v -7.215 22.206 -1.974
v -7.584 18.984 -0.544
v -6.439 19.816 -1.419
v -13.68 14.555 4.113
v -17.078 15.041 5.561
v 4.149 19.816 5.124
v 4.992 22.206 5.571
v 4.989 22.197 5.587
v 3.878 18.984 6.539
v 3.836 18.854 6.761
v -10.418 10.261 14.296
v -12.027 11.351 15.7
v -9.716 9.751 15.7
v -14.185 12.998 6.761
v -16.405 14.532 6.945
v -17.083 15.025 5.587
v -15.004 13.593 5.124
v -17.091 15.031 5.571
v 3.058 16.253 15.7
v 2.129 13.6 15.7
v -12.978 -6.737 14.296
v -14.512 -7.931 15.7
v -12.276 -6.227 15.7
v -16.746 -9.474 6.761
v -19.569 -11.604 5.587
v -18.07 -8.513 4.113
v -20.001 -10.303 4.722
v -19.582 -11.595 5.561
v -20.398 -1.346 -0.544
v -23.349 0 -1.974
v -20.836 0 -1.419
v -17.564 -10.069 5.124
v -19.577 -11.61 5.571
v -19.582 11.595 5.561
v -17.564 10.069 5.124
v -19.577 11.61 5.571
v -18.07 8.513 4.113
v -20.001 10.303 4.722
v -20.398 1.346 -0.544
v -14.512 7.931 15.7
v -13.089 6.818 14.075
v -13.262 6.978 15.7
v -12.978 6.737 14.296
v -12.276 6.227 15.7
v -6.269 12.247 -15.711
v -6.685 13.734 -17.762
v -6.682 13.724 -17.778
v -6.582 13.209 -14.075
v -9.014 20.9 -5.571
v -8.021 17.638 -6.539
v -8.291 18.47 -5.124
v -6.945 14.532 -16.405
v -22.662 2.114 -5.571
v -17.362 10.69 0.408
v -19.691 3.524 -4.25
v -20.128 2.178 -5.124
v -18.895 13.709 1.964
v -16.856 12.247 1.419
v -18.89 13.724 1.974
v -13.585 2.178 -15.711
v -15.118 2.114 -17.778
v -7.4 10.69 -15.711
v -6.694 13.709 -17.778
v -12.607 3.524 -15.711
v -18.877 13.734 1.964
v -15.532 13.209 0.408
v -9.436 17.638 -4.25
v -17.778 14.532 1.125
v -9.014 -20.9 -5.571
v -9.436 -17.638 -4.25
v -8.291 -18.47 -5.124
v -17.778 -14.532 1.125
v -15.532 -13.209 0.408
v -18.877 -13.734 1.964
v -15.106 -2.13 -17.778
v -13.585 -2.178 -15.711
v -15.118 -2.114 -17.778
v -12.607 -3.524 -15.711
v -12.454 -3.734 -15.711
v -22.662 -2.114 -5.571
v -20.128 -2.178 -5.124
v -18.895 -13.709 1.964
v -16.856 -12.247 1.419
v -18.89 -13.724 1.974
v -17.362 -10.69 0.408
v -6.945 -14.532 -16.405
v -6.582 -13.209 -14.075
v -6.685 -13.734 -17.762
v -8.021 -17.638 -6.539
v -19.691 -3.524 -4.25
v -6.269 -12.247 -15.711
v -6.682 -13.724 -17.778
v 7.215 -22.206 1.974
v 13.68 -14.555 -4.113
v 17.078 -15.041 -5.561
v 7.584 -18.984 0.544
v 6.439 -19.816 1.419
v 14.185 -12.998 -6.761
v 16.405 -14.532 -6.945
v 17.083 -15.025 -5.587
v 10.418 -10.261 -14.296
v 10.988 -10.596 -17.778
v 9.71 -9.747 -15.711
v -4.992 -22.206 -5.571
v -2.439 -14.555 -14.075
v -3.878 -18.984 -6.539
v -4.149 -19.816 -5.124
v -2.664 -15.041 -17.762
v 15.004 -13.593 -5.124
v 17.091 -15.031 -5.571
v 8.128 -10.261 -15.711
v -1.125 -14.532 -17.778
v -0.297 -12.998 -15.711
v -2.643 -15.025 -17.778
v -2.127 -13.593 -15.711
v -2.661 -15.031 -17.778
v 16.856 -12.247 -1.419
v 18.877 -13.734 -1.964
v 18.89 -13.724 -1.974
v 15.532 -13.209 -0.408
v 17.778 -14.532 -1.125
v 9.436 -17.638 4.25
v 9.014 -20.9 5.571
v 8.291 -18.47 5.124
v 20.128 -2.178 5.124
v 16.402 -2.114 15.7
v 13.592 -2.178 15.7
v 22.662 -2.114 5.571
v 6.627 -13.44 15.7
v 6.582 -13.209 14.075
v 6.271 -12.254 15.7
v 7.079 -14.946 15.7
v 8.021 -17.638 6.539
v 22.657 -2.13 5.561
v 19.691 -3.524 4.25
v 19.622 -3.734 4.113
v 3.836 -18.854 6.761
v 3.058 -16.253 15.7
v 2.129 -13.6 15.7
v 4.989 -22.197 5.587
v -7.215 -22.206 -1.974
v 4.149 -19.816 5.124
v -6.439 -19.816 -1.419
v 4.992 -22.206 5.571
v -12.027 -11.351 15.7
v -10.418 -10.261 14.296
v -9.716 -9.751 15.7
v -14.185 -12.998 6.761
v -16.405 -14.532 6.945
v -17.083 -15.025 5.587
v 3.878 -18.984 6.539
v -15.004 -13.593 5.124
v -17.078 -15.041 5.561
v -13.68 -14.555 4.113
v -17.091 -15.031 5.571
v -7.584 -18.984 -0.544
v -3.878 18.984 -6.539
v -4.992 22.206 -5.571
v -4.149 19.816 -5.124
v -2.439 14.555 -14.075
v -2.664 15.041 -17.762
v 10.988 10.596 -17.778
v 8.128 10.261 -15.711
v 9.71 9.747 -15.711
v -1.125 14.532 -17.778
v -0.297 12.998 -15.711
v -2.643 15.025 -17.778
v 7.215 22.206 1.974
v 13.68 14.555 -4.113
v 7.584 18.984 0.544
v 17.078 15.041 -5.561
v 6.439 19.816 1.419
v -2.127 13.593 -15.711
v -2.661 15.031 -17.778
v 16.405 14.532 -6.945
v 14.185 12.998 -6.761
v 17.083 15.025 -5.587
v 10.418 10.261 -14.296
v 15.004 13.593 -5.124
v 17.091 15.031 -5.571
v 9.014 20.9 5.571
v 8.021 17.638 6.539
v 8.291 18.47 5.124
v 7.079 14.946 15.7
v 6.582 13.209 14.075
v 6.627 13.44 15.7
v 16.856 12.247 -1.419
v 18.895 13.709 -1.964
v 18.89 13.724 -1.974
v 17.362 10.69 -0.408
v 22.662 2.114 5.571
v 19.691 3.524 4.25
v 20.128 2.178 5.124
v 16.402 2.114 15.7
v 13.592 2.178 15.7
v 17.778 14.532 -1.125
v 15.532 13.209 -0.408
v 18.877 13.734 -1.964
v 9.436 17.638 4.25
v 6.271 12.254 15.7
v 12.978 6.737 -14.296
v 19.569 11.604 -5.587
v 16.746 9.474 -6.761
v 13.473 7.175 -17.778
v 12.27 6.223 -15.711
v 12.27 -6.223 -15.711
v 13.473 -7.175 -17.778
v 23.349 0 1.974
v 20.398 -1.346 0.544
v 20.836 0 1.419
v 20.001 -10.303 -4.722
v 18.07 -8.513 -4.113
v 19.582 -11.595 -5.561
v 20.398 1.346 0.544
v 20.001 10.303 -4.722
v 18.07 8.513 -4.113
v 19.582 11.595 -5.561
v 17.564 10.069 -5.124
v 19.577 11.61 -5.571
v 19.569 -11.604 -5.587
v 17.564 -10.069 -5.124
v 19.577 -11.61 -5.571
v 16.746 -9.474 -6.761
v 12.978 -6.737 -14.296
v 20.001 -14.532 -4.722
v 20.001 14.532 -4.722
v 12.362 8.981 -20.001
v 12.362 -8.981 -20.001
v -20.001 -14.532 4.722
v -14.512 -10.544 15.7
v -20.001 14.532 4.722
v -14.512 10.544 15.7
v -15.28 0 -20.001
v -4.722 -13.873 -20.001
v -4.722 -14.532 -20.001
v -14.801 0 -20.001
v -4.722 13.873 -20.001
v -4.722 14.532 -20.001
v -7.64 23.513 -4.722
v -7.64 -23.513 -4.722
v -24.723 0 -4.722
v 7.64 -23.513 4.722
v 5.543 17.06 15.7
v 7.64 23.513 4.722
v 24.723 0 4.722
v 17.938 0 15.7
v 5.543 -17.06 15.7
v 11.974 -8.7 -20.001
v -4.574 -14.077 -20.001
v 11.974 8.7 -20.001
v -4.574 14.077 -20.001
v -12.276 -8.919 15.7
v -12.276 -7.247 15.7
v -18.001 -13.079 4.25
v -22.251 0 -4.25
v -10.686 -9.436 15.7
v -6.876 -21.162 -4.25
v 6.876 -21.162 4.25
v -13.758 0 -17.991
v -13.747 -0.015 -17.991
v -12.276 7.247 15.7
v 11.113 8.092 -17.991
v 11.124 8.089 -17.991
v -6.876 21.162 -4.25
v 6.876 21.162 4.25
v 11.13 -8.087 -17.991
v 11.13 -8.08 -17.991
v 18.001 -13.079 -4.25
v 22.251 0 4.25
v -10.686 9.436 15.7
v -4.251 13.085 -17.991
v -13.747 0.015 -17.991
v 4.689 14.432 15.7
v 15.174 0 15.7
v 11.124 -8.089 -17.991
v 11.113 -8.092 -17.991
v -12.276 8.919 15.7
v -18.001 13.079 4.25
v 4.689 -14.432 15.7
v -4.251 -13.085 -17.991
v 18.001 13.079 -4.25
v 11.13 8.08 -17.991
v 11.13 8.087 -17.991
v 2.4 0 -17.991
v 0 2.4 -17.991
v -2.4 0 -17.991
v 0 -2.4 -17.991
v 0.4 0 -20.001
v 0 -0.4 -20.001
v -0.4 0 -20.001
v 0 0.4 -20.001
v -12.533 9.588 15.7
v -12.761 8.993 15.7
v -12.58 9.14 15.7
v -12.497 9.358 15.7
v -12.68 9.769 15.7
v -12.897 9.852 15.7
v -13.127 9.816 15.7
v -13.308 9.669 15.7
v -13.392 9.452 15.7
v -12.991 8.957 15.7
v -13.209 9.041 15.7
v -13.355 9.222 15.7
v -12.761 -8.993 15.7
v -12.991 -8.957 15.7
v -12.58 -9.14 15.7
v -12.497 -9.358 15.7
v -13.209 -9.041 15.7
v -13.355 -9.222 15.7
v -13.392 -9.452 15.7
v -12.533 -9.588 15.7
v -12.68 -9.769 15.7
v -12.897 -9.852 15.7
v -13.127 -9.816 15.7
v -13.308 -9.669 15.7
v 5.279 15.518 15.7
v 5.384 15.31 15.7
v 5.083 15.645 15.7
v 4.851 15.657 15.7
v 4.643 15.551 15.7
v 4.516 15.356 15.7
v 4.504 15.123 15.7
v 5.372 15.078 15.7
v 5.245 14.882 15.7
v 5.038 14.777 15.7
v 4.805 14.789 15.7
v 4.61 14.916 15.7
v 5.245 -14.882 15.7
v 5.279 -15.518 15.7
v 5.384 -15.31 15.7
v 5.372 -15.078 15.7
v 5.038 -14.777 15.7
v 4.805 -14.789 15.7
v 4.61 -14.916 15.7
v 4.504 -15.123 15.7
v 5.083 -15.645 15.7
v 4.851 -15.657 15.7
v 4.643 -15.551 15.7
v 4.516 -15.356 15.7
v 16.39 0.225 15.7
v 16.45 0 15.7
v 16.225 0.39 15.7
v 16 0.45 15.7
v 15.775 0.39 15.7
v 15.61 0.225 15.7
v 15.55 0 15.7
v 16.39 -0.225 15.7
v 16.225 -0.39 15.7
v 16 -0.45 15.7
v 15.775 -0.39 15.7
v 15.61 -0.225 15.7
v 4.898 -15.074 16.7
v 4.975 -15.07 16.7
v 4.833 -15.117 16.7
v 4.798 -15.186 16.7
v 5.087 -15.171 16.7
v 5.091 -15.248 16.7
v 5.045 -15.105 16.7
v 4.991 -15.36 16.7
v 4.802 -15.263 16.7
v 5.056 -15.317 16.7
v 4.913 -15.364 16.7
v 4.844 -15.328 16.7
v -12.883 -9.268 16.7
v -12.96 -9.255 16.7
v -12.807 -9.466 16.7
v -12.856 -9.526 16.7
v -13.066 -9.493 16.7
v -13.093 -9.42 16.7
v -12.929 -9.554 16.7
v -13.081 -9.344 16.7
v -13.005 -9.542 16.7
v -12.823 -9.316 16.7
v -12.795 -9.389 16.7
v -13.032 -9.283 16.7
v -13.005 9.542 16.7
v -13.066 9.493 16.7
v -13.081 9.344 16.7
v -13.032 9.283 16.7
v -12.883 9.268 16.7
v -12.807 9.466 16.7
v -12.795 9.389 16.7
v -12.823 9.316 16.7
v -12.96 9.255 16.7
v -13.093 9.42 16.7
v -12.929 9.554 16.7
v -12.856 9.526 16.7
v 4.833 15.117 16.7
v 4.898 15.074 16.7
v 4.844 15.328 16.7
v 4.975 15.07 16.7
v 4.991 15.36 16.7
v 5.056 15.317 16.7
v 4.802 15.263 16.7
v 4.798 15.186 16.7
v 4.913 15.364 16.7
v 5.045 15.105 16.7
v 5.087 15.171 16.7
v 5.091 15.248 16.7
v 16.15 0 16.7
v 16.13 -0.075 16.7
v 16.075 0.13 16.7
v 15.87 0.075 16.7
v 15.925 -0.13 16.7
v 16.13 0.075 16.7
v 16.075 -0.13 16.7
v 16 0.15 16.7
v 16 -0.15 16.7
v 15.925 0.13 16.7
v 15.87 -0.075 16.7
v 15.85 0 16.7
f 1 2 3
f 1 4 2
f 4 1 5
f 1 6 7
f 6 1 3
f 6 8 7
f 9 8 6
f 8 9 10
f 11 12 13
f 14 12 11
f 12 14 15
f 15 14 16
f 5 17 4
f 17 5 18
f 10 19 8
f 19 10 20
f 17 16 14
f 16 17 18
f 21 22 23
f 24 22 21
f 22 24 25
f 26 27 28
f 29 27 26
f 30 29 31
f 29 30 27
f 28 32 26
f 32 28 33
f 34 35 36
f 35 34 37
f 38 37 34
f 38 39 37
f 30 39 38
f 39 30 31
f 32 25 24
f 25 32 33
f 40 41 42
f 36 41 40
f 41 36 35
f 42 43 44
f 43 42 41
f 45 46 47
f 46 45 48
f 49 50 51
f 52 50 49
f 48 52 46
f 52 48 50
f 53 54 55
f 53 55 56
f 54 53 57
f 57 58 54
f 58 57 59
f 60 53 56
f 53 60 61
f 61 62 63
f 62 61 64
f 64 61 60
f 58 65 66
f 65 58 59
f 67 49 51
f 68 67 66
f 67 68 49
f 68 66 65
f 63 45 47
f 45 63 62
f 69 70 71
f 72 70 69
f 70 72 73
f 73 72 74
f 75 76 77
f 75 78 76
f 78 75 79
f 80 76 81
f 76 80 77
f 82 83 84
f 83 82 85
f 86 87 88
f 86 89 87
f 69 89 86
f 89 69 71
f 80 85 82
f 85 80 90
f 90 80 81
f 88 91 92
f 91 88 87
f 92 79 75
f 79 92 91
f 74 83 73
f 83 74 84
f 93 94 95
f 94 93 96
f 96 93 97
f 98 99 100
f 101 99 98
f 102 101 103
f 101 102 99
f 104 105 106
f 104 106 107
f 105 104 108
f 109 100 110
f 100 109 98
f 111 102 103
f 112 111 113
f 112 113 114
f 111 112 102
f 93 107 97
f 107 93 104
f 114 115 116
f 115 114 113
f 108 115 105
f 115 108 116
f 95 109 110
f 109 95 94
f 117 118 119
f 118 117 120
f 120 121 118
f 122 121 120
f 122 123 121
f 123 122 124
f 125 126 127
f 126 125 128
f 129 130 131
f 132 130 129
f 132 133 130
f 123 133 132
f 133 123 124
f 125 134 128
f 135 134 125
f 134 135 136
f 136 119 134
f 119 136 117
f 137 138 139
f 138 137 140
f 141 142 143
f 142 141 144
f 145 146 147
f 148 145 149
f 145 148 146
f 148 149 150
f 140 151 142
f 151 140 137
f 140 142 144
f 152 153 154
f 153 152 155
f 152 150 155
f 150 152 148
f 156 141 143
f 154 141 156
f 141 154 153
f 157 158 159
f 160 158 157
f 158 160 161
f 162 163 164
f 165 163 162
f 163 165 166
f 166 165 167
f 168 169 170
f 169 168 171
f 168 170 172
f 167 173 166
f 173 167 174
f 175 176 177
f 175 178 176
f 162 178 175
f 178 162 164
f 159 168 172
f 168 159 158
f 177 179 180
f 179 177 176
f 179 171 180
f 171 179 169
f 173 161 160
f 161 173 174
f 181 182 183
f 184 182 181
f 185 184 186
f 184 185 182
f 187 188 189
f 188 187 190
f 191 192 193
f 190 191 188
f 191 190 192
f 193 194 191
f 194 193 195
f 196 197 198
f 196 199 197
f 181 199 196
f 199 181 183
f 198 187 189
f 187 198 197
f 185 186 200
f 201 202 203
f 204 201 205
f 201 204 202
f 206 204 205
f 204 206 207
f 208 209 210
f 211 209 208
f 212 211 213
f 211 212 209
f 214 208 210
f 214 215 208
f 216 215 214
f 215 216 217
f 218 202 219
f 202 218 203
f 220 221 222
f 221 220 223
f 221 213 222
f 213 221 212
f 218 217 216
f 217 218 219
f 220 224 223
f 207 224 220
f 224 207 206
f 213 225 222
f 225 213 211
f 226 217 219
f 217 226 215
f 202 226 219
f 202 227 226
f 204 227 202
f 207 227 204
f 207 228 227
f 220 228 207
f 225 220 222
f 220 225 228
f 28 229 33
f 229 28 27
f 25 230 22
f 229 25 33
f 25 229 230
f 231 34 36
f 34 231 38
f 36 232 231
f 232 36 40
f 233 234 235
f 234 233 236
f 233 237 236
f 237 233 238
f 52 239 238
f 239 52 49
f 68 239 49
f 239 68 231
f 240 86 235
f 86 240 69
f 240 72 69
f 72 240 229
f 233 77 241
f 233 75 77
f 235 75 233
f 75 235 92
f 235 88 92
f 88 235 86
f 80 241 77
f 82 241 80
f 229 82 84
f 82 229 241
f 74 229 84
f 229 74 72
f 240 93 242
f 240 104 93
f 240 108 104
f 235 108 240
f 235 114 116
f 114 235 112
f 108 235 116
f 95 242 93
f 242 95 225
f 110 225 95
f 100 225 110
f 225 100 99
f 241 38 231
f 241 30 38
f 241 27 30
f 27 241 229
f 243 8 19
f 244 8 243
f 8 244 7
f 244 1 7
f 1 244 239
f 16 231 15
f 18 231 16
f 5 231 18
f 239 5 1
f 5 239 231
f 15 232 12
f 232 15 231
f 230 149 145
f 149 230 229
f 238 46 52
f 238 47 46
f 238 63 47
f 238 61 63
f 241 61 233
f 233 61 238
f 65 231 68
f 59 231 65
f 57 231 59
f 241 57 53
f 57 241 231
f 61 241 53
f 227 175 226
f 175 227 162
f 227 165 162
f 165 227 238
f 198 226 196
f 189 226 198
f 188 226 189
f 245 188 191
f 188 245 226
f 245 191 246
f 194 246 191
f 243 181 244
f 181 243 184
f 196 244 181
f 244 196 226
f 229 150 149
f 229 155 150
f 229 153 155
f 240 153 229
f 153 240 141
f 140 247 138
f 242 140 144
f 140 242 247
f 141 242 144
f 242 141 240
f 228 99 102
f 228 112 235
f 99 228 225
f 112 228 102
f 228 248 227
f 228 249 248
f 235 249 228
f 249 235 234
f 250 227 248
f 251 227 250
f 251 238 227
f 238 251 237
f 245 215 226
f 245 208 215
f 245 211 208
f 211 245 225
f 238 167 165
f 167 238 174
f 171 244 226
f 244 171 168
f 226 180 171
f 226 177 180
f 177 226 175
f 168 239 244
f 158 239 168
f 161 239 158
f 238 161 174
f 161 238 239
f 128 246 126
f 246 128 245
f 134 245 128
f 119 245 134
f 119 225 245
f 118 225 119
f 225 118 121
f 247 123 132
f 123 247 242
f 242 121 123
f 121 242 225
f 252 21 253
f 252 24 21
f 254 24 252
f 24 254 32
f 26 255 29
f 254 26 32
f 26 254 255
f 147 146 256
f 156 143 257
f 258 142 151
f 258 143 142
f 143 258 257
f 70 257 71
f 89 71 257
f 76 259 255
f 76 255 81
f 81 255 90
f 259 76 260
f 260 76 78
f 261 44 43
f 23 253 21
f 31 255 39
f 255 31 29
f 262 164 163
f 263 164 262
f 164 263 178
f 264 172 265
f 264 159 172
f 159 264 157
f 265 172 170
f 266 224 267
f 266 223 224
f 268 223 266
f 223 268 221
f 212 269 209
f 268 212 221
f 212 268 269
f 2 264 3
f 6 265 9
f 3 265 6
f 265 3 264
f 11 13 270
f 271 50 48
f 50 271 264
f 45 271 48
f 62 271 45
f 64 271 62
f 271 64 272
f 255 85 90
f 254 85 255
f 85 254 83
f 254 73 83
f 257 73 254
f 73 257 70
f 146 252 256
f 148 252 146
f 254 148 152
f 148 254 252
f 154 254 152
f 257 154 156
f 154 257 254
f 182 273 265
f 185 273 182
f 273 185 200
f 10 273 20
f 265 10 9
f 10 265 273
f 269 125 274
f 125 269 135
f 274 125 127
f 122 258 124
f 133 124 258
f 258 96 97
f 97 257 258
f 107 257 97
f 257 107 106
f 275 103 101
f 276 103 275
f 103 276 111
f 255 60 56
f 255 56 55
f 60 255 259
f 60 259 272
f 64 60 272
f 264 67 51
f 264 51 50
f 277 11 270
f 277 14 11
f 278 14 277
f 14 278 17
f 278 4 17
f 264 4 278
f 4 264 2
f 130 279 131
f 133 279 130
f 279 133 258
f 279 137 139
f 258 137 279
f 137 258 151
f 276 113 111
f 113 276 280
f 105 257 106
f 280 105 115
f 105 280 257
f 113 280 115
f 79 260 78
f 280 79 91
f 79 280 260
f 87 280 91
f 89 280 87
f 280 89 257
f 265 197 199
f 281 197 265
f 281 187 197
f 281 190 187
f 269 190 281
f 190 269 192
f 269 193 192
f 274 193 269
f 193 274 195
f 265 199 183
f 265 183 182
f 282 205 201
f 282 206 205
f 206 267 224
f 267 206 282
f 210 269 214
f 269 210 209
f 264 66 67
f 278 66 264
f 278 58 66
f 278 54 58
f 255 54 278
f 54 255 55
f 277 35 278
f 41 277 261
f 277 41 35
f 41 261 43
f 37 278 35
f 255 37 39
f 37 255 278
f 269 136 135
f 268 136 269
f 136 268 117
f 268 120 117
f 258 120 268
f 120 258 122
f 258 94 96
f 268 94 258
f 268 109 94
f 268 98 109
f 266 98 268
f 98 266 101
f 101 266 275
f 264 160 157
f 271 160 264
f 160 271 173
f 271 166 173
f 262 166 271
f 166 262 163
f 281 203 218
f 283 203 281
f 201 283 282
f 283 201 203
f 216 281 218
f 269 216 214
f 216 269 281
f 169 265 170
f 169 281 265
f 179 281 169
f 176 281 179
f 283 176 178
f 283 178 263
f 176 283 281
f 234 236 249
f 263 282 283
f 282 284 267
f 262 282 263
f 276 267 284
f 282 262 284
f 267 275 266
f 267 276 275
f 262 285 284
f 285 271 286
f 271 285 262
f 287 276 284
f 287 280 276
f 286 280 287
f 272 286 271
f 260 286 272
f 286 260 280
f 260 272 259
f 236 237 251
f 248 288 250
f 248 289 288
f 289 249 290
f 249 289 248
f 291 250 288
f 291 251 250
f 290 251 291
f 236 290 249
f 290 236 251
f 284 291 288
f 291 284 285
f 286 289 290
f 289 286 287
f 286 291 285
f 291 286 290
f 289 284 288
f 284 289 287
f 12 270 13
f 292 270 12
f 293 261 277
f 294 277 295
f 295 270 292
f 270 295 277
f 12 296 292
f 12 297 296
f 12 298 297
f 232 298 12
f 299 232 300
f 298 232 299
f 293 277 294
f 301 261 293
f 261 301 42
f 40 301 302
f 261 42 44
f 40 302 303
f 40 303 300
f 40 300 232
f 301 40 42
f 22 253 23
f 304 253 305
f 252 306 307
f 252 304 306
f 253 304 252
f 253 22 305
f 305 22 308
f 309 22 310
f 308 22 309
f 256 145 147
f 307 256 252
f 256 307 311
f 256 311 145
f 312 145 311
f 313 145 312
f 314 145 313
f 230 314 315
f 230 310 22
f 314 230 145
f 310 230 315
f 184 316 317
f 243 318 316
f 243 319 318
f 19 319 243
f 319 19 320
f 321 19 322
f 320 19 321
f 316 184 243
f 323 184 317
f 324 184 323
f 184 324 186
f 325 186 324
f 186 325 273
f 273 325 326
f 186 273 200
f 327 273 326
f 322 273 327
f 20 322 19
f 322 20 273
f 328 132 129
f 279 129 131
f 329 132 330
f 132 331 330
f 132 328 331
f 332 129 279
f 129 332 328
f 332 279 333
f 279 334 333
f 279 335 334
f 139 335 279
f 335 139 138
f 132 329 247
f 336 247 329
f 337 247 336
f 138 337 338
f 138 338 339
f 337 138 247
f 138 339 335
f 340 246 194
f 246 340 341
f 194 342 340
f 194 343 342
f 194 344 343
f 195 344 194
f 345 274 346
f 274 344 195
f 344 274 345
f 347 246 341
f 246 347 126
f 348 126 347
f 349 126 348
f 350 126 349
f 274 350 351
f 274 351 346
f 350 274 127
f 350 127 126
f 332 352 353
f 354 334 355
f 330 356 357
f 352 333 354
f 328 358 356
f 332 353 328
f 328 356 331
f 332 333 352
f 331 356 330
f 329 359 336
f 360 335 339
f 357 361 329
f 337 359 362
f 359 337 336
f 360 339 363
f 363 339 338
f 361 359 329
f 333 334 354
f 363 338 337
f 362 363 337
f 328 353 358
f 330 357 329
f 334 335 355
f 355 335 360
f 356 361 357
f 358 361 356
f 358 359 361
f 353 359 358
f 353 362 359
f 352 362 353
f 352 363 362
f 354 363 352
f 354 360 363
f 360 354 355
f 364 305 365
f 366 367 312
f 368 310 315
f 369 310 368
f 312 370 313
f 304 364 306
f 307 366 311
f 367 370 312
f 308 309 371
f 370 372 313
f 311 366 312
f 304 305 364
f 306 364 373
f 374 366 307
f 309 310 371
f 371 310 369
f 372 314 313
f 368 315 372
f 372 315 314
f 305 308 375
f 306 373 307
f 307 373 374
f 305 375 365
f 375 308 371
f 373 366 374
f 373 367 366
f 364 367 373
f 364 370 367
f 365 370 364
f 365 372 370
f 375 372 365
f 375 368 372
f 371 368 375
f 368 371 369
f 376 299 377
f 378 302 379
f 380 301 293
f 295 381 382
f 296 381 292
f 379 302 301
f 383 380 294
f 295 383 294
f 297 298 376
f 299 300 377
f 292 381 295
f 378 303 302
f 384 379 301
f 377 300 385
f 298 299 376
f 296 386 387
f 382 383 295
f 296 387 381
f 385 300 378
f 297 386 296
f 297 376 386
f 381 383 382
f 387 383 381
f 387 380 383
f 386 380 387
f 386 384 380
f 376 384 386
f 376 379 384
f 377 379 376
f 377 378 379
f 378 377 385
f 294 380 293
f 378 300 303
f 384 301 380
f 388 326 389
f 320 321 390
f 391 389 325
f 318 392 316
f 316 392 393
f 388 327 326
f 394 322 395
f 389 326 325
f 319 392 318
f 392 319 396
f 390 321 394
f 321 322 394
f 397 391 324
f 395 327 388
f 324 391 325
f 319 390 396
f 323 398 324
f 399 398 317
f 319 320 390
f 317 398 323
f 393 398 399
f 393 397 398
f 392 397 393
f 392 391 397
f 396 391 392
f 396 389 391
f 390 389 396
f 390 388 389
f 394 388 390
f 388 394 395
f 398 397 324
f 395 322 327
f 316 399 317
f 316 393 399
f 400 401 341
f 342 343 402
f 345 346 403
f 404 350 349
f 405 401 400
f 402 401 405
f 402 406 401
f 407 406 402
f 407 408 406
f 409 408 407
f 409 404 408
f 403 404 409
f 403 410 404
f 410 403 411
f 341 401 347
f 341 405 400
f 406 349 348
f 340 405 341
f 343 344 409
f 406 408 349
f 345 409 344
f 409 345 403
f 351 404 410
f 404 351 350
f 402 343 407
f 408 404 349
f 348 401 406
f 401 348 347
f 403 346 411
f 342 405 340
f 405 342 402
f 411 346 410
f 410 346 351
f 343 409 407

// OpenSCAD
arete = 28.28;
paroi = 1.5;
echelleReductionAjustementBouchon = 0.965;
r = 0.19; // résolution d'impression sur l'axe Z
octa_sch = [3,4];
Cpi = 3.14159;
Cphi = (1+sqrt(5))/2;
Cepsilon = 0.00000001;

function octa_ext_radius(a) = 
    a/2*(sqrt(2));
    
function octa_int_radius(a) = 
    a/6*sqrt(6);
    
function octa_arete_from(radius) = 
    radius*6/sqrt(6);
    
externalRadius = octa_ext_radius(arete);
internalRadius = octa_ext_radius(
                    octa_arete_from(
                        octa_int_radius(arete)-paroi));
                        
echo(externalRadius);
echo(internalRadius);

//rotate([-45, 0, 0])
//rotate([0, -90+plat_dihedral(octa_sch)/2, 0])
//    octahedron(externalRadius);
//octa_creux();
//decoupe_bouchon();
//corps_ouvert();
//bouchon();
//trou();

module corps_ouvert() {
	difference() {
		octa_creux();
		decoupe_bouchon();
	}
}

module bouchon() {
//    rotate([180, 0, 0])
	scale([echelleReductionAjustementBouchon, echelleReductionAjustementBouchon, 0.995])
	difference () {
        intersection() {
            octa_creux();
            decoupe_bouchon(echelleReductionAjustementBouchon);
        }
	}
}

module octa_creux() {
	difference() {
        octahedron(externalRadius);
        octahedron(internalRadius);
	}
}

module decoupe_bouchon(scale=1) {
    distance = octa_int_radius(arete);
	rotate([0,0,60]) translate([0,0, distance])
		cylinder(paroi, r=arete*0.545, $fn=3, center=true);
	rotate([0,0,60]) translate([0,0, distance-paroi+0.4])
		cylinder(paroi-0.4, r=(arete-paroi)*0.523, $fn=3, center=true);
}


module octahedron(rad) {
    // create an instance of a spherical coordinate
    // long - rotation around z -axis
    // lat - latitude, starting at 0 == 'north pole'
    // rad - distance from center
    function sph(long, lat, rad=1) = [long, lat, rad];
    
    // Convert spherical to cartesian
    function sph_to_cart(s) = [
	clean(s[2]*sin(s[1])*cos(s[0])),  

	clean(s[2]*sin(s[1])*sin(s[0])),

	clean(s[2]*cos(s[1]))
	];

    function sphu_from_cart(c, rad=1) = sph(
        atan2(c[1],c[0]), 
        atan2(sqrt(c[0]*c[0]+c[1]*c[1]), c[2]), 
        rad
        );

    octa_cart = [
        [+1, 0, 0],  // + x axis
        [-1, 0, 0],	// - x axis
        [0, +1, 0],	// + y axis
        [0, -1, 0],	// - y axis
        [0, 0, +1],	// + z axis
        [0, 0, -1] 	// - z axis
    ];

    function octa_unit(rad=1) = [
        sph_to_cart(sphu_from_cart(octa_cart[0], rad)), 
        sph_to_cart(sphu_from_cart(octa_cart[1], rad)),
        sph_to_cart(sphu_from_cart(octa_cart[2], rad)),
        sph_to_cart(sphu_from_cart(octa_cart[3], rad)),
        sph_to_cart(sphu_from_cart(octa_cart[4], rad)), 
        sph_to_cart(sphu_from_cart(octa_cart[5], rad)), 
        ];

    octafaces = [
        [4,2,0],
        [4,0,3],
        [4,3,1],
        [4,1,2],
        [5,0,2],
        [5,3,0],
        [5,1,3],
        [5,2,1]
        ];

    octa_edges = [
        [0,2], 
        [0,3],
        [0,4],
        [0,5],
        [1,2],
        [1,3],
        [1,4],
        [1,5],
        [2,4], 
        [2,5],
        [3,4],
        [3,5],
        ];

    function octahedron(rad=1) = [octa_unit(rad), octafaces, octa_edges];

    rotate([0, 90-plat_dihedral(octa_sch)/2, 0])
    rotate([45, 0, 0])
    polyhedron(octa_unit(rad), faces=octafaces);
}
//translate([0, 0, -17.7])
//cylinder(5,40,40);

function clean(n) = (n < 0) ? ((n < -Cepsilon) ? n : 0) : 
	(n < Cepsilon) ? 0 : n; 

function plat_dihedral(pq) = 2 * asin( cos(180/pq[1])/sin(180/pq[0]));

function plat_circumradius(pq, a) = 
	(a/2)*
	tan(Cpi/pq[1])*
	tan(plat_dihedral(pq)/2);

function plat_midradius(pq, a) = 
	(a/2)*
	cos(Cpi/pq[0])*
	tan(plat_dihedral(pq)/2);

function plat_inradius(pq,a) = 
	a/(2*tan(Cpi/pq[0]))*
	sqrt((1-cos(plat_dihedral(pq)))/(1+cos(plat_dihedral(pq))));

function plat_a_from_inradius(pq, inradius) =
    inradius*(2*tan(Cpi/pq[0]))/
	sqrt((1-cos(plat_dihedral(pq)))/(1+cos(plat_dihedral(pq))));




// Dodecahedron

// base coordinates
// source:  http://dmccooey.com/polyhedra/Dodecahedron.txt
// generated by  http://kitwallace.co.uk/3d/solid-to-scad.xq
Name = "Dodecahedron";
// 5 sided faces = 12
C0 = 0.809016994374947424102293417183;
C1 = 1.30901699437494742410229341718;
points = [
[ 0.0,  0.5,   C1],
[ 0.0,  0.5,  -C1],
[ 0.0, -0.5,   C1],
[ 0.0, -0.5,  -C1],
[  C1,  0.0,  0.5],
[  C1,  0.0, -0.5],
[ -C1,  0.0,  0.5],
[ -C1,  0.0, -0.5],
[ 0.5,   C1,  0.0],
[ 0.5,  -C1,  0.0],
[-0.5,   C1,  0.0],
[-0.5,  -C1,  0.0],
[  C0,   C0,   C0],
[  C0,   C0,  -C0],
[  C0,  -C0,   C0],
[  C0,  -C0,  -C0],
[ -C0,   C0,   C0],
[ -C0,   C0,  -C0],
[ -C0,  -C0,   C0],
[ -C0,  -C0,  -C0]];
faces = [
[ 12 ,  4, 14,  2,  0],
[ 16 , 10,  8, 12,  0],
[  2 , 18,  6, 16,  0],
[ 17 , 10, 16,  6,  7],
[ 19 ,  3,  1, 17,  7],
[  6 , 18, 11, 19,  7],
[ 15 ,  3, 19, 11,  9],
[ 14 ,  4,  5, 15,  9],
[ 11 , 18,  2, 14,  9],
[  8 , 10, 17,  1, 13],
[  5 ,  4, 12,  8, 13],
[  1 ,  3, 15,  5, 13]];
edges = [
[4,12],
[4,14],
[2,14],
[0,2],
[0,12],
[10,16],
[8,10],
[8,12],
[0,16],
[2,18],
[6,18],
[6,16],
[10,17],
[6,7],
[7,17],
[3,19],
[1,3],
[1,17],
[7,19],
[11,18],
[11,19],
[3,15],
[9,11],
[9,15],
[4,5],
[5,15],
[9,14],
[1,13],
[8,13],
[5,13]];
// --------------------------------- 


// cut holes out of shell
eps=0.02;
radius=25.17;
shell_ratio=0.1;
prism_base_ratio =0.8;
prism_height_ratio=0.42;
prism_scale=0.5;
nfaces = [];
scale=1;

//insert

spoints = normalize(centre_points(points),radius);
sfaces = lhs_faces(faces,spoints);
cfaces =  select_nsided_faces(sfaces,nfaces);

hauteur = radius_sphere_inscrite(arete_from_sphere_circonscrite(radius))*2;

module base() {
    rotate([0,0,0])
        translate([0,0,-hauteur/2])
    difference() {
        cylinder(r=hauteur*0.37, h=2.01, $fn=5, center=false);
        cylinder(r1=0.4, r2=2.4, h=2.01, $fn=4, center=false);
    }
}

module plafond() {
    rotate([0,180,0]) base();
}

module dode_construct() {
    difference() {
        polyhedron(spoints,sfaces);
        scale(1-shell_ratio) polyhedron(spoints,sfaces);
        face_prisms_in(cfaces,spoints,prism_base_ratio,prism_scale,prism_height_ratio);
    }
}

module dodecahedron() {
scale(scale)
translate([0, 0, -hauteur/2])
 place_on_largest_face(sfaces,spoints)
   dode_construct();
}

module assemblage_dode() {
    union() {
        dodecahedron();
        base();
        plafond();
    }
}
 
module dode_bottom() {
    difference() {        
        assemblage_dode();
        decoupe();
        plots(2, 1.2, 0);
    }
}
 
module dode_top() {
    rotate([180,0,0])
    union() {
        intersection() {        
            assemblage_dode();
            decoupe();
        }
        plots(0.9, 1, 0.6);
    }
}

module decoupe() {
    translate([0, 0, -hauteur/2.548])
        cylinder(h=666, d=666);
}

module plots(diam, h, cone) {
    for (i = [1:5]) {
      rotate([0, 0, 360/5*i])
        translate([16, 0, (-hauteur/2.548)-(h/2)])
            cylinder(d1=diam-cone, d2=diam, h=h, $fn=12, center=true);
    }
}

//decoupe();
dode_top();
//dode_bottom();

function radius_sphere_inscrite(arete) =
    arete*sqrt(5/8+11/(8*sqrt(5)));

function arete_from_sphere_circonscrite(radius) =
    radius*4/(sqrt(3)+sqrt(15));

// ruler(10);

// functions for the construction of polyhedra
// chris wallace
// see http://kitwallace.tumblr.com/tagged/polyhedra for info


//  functions for creating the matrices for transforming a single point

function m_translate(v) = [ [1, 0, 0, 0],
                            [0, 1, 0, 0],
                            [0, 0, 1, 0],
                            [v.x, v.y, v.z, 1  ] ];
                            
function m_rotate(v) =  [ [1,  0,         0,        0],
                          [0,  cos(v.x),  sin(v.x), 0],
                          [0, -sin(v.x),  cos(v.x), 0],
                          [0,  0,         0,        1] ]
                      * [ [ cos(v.y), 0,  -sin(v.y), 0],
                          [0,         1,  0,        0],
                          [ sin(v.y), 0,  cos(v.y), 0],
                          [0,         0,  0,        1] ]
                      * [ [ cos(v.z),  sin(v.z), 0, 0],
                          [-sin(v.z),  cos(v.z), 0, 0],
                          [ 0,         0,        1, 0],
                          [ 0,         0,        0, 1] ];
                            
function vec3(v) = [v.x, v.y, v.z];
function transform(v, m)  = vec3([v.x, v.y, v.z, 1] * m);
                            
function matrix_to(p0, p) = 
                       m_rotate([0, atan2(sqrt(pow(p[0], 2) + pow(p[1], 2)), p[2]), 0]) 
                     * m_rotate([0, 0, atan2(p[1], p[0])]) 
                     * m_translate(p0);

function matrix_from(p0, p) = 
                      m_translate(-p0)
                      * m_rotate([0, 0, -atan2(p[1], p[0])]) 
                      * m_rotate([0, -atan2(sqrt(pow(p[0], 2) + pow(p[1], 2)), p[2]), 0]); 

function transform_points(list, matrix, i = 0) = 
    i < len(list) 
       ? concat([ transform(list[i], matrix) ], transform_points(list, matrix, i + 1))
       : [];


//  convert from point indexes to point coordinates

function as_points(indexes,points,i=0) =
     i < len(indexes) 
        ?  concat([points[indexes[i]]], as_points(indexes,points,i+1))
        : [];

//  basic vector functions
function normal_r(face) =
     cross(face[1]-face[0],face[2]-face[0]);

function normal(face) =
     - normal_r(face) / norm(normal_r(face));

function centre(points) = 
      vsum(points) / len(points);

// sum a list of vectors
function vsum(points,i=0) =  
      i < len(points)
        ?  (points[i] + vsum(points,i+1))
        :  [0,0,0];

function ssum(list,i=0) =  
      i < len(list)
        ?  (list[i] + ssum(list,i+1))
        :  0;


// add a vector to a list of vectors
function vadd(points,v,i=0) =
      i < len(points)
        ?  concat([points[i] + v], vadd(points,v,i+1))
        :  [];

function reverse_r(v,n) =
      n == 0 
        ? [v[0]]
        : concat([v[n]],reverse_r(v,n-1));

function reverse(v) = reverse_r(v, len(v)-1);

function sum_norm(points,i=0) =
    i < len(points)
       ?  norm(points[i]) + sum_norm(points,i+1)
       : 0 ;

function average_radius(points) =
       sum_norm(points) / len(points);


// select one dimension of a list of vectors
function slice(v,k,i=0) =
   i <len(v)
      ?  concat([v[i][k]], slice(v,k,i+1))
      : [];

function max(v, max=-9999999999999999,i=0) =
     i < len(v) 
        ?  v[i] > max 
            ?  max(v, v[i], i+1 )
            :  max(v, max, i+1 ) 
        : max;

function min(v, min=9999999999999999,i=0) =
     i < len(v) 
        ?  v[i] < min 
            ?  min(v, v[i], i+1 )
            :  min(v, min, i+1 ) 
        : min;

function project(pts,i=0) =
     i < len(pts)
        ? concat([[pts[i][0],pts[i][1]]], project(pts,i+1))
        : [];
        
function contains(n, list, i=0) =
     i < len(list) 
        ?  n == list[i]
           ?  true
           :  contains(n,list,i+1)
        : false;

// normalize the points to have origin at 0,0,0 
function centre_points(points) = 
     vadd(points, - centre(points));

//scale to average radius = radius
function normalize(points,radius) =
    points * radius /average_radius(points);
 
function select_nsided_faces(faces,nsides,i=0) =
  len(nsides) == 0
     ?  faces
     :  i < len(faces)
         ?  contains(len(faces[i]), nsides)
             ? concat([faces[i]],  select_nsided_faces(faces,nsides,i+1))
             : select_nsided_faces(faces,nsides,i+1)
         : [];
         
function longest_edge(face,max=-1,i=0) =
       i < len(face)
          ?  norm(face[i] - face[(i+1)% len(face)]) > max
             ?  longest_edge(face, norm(face[i] - face[(i+1)% len(face)]),i+1)
             :  longest_edge(face, max,i+1)
          : max ;

function point_edges(point,edges,i=0) =
    i < len(edges) 
       ? point == edges[i][0] || point == edges[i][1]
         ? concat([edges[i]], point_edges(point,edges,i+1))
         : point_edges(point,edges,i+1)
       : [];

function select_nedged_points(points,edges,nedges,i=0) =
     i < len(points) 
         ?  len(point_edges(i,edges)) == nedges
             ? concat([i],  select_nedged_points(points,edges,nedges,i+1))
             : select_nedged_points(points,edges,nedges,i+1)
         : [];

function triangle(a,b) = norm(cross(a,b))/2;

function face_area_centre(face,centre,i=0) =
    i < len(face)
       ?  triangle(
                face[i] - centre,
                face[(i+1) % len(face)] - centre)
          + face_area_centre(face,centre,i+1)
       : 0 ;

function face_area(face) = face_area_centre(face,centre(face));

function face_areas(faces,points,i=0) =
   i < len(faces)
      ? concat([[i,  face_area(as_points(faces[i],points))]] ,
               face_areas(faces,points,i+1))
      : [] ;
 
function max_area(areas, max=[-1,-1], i=0) =
   i <len(areas)
      ? areas[i][1] > max[1]
         ?  max_area(areas,areas[i],i+1)
         :  max_area(areas,max,i+1)
      : max;


function bbox(v) = [
   [min(slice(spoints,0)), max(slice(spoints,0))],
   [min(slice(spoints,1)), max(slice(spoints,1))],
   [min(slice(spoints,2)), max(slice(spoints,2))]
];

// check that all faces have a lhs orientation
function cosine_between(u, v) =(u * v) / (norm(u) * norm(v));

function lhs_faces(faces,points,i=0) =
     i < len(faces) 
        ?  cosine_between(normal(as_points(faces[i],points)),
                         centre(as_points(faces[i],points))) < 0
            ?  concat([reverse(faces[i])],lhs_faces(faces,points,i+1))
            :  concat([faces[i]],lhs_faces(faces,points,i+1))
        : [] ;


function fs(p) = f(p[0],p[1],p[2]);

function modulate_point(p) =
    spherical_to_xyz(fs(xyz_to_spherical(p)));

function modulate_points(points,i=0) =
   i < len(points)
      ? concat([modulate_point(points[i])],modulate_points(points,i+1))
      : [];

function xyz_to_spherical(p) =
    [ norm(p), acos(p.z/ norm(p)), atan2(p.x,p.y)] ;

function spherical_to_xyz_full(r,theta,phi) =
    [ r * sin(theta) * cos(phi),
      r * sin(theta) * sin(phi),
      r * cos(theta)];

function spherical_to_xyz(s) =
     spherical_to_xyz_full(s[0],s[1],s[2]);

function select_large_faces(faces,points, min,i=0) =
  i < len(faces)
     ?  face_area(as_points(faces[i],points)) > min
       ? concat([faces[i]],  select_large_faces(faces,points,min,i+1))
       :select_large_faces(faces,points,min,i+1)     
     : [];
        
function lower(char) =
    contains(char,"abcdefghijklmnopqrstuvwxyz") ;

function char_layer(char) =
    lower(char) 
         ? str(char,"_")
         : char;

module write_char(font,char) {
	linear_extrude(height=1,convexity=10) 
      import(file=str("write/",font,".dxf"),layer=char_layer(char));
};

module write_centred_char(font,char) {
	linear_extrude(height=1,convexity=10) 
      translate([-2.5,-4,0])
          import(file=str("write/",font,".dxf"),layer=char_layer(char));
};
module engrave_face_word(faces,points,word,font,ratio,thickness) {
    for (i=[0:len(faces) - 1]) {
      if (i <len(word)) {
        f = as_points(faces[i],points); 
        n = normal(f); c = centre(f);
        s = longest_edge(f) / 20* ratio;
           orient_to(c,n)  
                translate([0,0,-thickness+eps])
                     scale([s,s,thickness])
                          write_centred_char(font,word[i]);
      }
  }
}
                          
module orient_to(centre, normal) {   
      translate(centre)
      rotate([0, 0, atan2(normal[1], normal[0])]) //rotation
      rotate([0, atan2(sqrt(pow(normal[0], 2)+pow(normal[1], 2)),normal[2]), 0])
      children();
}

module orient_from(centre, normal) {   
      rotate([0, -atan2(sqrt(pow(normal[0], 2)+pow(normal[1], 2)),normal[2]), 0])
      rotate([0, 0, -atan2(normal[1], normal[0])]) //rotation
      translate(-centre)
      children();
}

module place_on_largest_face(faces,points) {
  largest = max_area(face_areas(faces,points));
  lpoints = as_points(faces[largest[0]],points);
  n = normal(lpoints); c = centre(lpoints);
  orient_from(c,-n)
  children();
}
              
module make_edge(edge, points, r) {
    p0 = points[edge[0]]; p1 = points[edge[1]];
    v = p1 -p0;
     orient_to(p0,v)
       cylinder(r=r, h=norm(v)); 
}

module make_edges(points, edges, r) {
   for (i =[0:len(edges)-1])
      make_edge(edges[i],points, r);
}

module make_vertices(points,r) { 
   for (i = [0:len(points)-1])
      translate(points[i]) sphere(r); 
}

module face_prism (face,prism_base_ratio,prism_scale,prism_height_ratio) {
    n = normal(face); c= centre(face);
    m = matrix_from(c,n);
    tpts =  prism_base_ratio * transform_points(face,m);
    max_length = longest_edge(face);
    xy = project(tpts);
      linear_extrude(height=prism_height_ratio * max_length, scale=prism_scale) 
          polygon(points=xy);
}

module face_prisms_in(faces,points,prism_base_ratio,prism_scale,prism_height_ratio) {
    for (i=[0:len(faces) - 1]) {
       f = as_points(faces[i],points); 
       n = normal(f); c = centre(f);
       orient_to(c,n) 
          translate([0,0,eps]) 
               mirror() rotate([0,180,0]) 
                   face_prism(f,prism_base_ratio,prism_scale,prism_height_ratio);
    }
}

module face_prisms_out(faces,points,prism_base_ratio,prism_scale,prism_height_ratio) {
    for (i=[0:len(faces) - 1])  {
       f = as_points(faces[i],points); 
       n = normal(f); c = centre(f);
       orient_to(c,n) 
          translate([0,0,-eps]) 
               face_prism(f,prism_base_ratio,prism_scale,prism_height_ratio);
    }
}

module face_prisms_through(faces,points,prism_base_ratio,prism_scale,prism_height_ratio) {
    for (i=[0:len(faces) - 1]) {
       f = as_points(faces[i],points); 
       n = normal(f); c = centre(f);
       orient_to(c,n) 
          translate([0,0,prism_height_ratio*longest_edge(f)/2]) 
               mirror() rotate([0,180,0]) 
                   face_prism(f,prism_base_ratio,prism_scale,prism_height_ratio);
    }
}
module ruler(n) {
   for (i=[0:n-1]) 
       translate([(i-n/2 +0.5)* 10,0,0]) cube([9.8,5,2], center=true);
}

module ground(size=50) {
   translate([0,0,-size]) cube(2*size,center=true);
}

module cross_section(size=50) {
   translate([0,0,-size]) cube(2*size);
}

module ring(radius,thickness,height) {
   difference() {
      cylinder(h=height,r=radius);
      translate([0,0,-eps]) cylinder(h=height+2*eps,r=radius - thickness);
   }
}
